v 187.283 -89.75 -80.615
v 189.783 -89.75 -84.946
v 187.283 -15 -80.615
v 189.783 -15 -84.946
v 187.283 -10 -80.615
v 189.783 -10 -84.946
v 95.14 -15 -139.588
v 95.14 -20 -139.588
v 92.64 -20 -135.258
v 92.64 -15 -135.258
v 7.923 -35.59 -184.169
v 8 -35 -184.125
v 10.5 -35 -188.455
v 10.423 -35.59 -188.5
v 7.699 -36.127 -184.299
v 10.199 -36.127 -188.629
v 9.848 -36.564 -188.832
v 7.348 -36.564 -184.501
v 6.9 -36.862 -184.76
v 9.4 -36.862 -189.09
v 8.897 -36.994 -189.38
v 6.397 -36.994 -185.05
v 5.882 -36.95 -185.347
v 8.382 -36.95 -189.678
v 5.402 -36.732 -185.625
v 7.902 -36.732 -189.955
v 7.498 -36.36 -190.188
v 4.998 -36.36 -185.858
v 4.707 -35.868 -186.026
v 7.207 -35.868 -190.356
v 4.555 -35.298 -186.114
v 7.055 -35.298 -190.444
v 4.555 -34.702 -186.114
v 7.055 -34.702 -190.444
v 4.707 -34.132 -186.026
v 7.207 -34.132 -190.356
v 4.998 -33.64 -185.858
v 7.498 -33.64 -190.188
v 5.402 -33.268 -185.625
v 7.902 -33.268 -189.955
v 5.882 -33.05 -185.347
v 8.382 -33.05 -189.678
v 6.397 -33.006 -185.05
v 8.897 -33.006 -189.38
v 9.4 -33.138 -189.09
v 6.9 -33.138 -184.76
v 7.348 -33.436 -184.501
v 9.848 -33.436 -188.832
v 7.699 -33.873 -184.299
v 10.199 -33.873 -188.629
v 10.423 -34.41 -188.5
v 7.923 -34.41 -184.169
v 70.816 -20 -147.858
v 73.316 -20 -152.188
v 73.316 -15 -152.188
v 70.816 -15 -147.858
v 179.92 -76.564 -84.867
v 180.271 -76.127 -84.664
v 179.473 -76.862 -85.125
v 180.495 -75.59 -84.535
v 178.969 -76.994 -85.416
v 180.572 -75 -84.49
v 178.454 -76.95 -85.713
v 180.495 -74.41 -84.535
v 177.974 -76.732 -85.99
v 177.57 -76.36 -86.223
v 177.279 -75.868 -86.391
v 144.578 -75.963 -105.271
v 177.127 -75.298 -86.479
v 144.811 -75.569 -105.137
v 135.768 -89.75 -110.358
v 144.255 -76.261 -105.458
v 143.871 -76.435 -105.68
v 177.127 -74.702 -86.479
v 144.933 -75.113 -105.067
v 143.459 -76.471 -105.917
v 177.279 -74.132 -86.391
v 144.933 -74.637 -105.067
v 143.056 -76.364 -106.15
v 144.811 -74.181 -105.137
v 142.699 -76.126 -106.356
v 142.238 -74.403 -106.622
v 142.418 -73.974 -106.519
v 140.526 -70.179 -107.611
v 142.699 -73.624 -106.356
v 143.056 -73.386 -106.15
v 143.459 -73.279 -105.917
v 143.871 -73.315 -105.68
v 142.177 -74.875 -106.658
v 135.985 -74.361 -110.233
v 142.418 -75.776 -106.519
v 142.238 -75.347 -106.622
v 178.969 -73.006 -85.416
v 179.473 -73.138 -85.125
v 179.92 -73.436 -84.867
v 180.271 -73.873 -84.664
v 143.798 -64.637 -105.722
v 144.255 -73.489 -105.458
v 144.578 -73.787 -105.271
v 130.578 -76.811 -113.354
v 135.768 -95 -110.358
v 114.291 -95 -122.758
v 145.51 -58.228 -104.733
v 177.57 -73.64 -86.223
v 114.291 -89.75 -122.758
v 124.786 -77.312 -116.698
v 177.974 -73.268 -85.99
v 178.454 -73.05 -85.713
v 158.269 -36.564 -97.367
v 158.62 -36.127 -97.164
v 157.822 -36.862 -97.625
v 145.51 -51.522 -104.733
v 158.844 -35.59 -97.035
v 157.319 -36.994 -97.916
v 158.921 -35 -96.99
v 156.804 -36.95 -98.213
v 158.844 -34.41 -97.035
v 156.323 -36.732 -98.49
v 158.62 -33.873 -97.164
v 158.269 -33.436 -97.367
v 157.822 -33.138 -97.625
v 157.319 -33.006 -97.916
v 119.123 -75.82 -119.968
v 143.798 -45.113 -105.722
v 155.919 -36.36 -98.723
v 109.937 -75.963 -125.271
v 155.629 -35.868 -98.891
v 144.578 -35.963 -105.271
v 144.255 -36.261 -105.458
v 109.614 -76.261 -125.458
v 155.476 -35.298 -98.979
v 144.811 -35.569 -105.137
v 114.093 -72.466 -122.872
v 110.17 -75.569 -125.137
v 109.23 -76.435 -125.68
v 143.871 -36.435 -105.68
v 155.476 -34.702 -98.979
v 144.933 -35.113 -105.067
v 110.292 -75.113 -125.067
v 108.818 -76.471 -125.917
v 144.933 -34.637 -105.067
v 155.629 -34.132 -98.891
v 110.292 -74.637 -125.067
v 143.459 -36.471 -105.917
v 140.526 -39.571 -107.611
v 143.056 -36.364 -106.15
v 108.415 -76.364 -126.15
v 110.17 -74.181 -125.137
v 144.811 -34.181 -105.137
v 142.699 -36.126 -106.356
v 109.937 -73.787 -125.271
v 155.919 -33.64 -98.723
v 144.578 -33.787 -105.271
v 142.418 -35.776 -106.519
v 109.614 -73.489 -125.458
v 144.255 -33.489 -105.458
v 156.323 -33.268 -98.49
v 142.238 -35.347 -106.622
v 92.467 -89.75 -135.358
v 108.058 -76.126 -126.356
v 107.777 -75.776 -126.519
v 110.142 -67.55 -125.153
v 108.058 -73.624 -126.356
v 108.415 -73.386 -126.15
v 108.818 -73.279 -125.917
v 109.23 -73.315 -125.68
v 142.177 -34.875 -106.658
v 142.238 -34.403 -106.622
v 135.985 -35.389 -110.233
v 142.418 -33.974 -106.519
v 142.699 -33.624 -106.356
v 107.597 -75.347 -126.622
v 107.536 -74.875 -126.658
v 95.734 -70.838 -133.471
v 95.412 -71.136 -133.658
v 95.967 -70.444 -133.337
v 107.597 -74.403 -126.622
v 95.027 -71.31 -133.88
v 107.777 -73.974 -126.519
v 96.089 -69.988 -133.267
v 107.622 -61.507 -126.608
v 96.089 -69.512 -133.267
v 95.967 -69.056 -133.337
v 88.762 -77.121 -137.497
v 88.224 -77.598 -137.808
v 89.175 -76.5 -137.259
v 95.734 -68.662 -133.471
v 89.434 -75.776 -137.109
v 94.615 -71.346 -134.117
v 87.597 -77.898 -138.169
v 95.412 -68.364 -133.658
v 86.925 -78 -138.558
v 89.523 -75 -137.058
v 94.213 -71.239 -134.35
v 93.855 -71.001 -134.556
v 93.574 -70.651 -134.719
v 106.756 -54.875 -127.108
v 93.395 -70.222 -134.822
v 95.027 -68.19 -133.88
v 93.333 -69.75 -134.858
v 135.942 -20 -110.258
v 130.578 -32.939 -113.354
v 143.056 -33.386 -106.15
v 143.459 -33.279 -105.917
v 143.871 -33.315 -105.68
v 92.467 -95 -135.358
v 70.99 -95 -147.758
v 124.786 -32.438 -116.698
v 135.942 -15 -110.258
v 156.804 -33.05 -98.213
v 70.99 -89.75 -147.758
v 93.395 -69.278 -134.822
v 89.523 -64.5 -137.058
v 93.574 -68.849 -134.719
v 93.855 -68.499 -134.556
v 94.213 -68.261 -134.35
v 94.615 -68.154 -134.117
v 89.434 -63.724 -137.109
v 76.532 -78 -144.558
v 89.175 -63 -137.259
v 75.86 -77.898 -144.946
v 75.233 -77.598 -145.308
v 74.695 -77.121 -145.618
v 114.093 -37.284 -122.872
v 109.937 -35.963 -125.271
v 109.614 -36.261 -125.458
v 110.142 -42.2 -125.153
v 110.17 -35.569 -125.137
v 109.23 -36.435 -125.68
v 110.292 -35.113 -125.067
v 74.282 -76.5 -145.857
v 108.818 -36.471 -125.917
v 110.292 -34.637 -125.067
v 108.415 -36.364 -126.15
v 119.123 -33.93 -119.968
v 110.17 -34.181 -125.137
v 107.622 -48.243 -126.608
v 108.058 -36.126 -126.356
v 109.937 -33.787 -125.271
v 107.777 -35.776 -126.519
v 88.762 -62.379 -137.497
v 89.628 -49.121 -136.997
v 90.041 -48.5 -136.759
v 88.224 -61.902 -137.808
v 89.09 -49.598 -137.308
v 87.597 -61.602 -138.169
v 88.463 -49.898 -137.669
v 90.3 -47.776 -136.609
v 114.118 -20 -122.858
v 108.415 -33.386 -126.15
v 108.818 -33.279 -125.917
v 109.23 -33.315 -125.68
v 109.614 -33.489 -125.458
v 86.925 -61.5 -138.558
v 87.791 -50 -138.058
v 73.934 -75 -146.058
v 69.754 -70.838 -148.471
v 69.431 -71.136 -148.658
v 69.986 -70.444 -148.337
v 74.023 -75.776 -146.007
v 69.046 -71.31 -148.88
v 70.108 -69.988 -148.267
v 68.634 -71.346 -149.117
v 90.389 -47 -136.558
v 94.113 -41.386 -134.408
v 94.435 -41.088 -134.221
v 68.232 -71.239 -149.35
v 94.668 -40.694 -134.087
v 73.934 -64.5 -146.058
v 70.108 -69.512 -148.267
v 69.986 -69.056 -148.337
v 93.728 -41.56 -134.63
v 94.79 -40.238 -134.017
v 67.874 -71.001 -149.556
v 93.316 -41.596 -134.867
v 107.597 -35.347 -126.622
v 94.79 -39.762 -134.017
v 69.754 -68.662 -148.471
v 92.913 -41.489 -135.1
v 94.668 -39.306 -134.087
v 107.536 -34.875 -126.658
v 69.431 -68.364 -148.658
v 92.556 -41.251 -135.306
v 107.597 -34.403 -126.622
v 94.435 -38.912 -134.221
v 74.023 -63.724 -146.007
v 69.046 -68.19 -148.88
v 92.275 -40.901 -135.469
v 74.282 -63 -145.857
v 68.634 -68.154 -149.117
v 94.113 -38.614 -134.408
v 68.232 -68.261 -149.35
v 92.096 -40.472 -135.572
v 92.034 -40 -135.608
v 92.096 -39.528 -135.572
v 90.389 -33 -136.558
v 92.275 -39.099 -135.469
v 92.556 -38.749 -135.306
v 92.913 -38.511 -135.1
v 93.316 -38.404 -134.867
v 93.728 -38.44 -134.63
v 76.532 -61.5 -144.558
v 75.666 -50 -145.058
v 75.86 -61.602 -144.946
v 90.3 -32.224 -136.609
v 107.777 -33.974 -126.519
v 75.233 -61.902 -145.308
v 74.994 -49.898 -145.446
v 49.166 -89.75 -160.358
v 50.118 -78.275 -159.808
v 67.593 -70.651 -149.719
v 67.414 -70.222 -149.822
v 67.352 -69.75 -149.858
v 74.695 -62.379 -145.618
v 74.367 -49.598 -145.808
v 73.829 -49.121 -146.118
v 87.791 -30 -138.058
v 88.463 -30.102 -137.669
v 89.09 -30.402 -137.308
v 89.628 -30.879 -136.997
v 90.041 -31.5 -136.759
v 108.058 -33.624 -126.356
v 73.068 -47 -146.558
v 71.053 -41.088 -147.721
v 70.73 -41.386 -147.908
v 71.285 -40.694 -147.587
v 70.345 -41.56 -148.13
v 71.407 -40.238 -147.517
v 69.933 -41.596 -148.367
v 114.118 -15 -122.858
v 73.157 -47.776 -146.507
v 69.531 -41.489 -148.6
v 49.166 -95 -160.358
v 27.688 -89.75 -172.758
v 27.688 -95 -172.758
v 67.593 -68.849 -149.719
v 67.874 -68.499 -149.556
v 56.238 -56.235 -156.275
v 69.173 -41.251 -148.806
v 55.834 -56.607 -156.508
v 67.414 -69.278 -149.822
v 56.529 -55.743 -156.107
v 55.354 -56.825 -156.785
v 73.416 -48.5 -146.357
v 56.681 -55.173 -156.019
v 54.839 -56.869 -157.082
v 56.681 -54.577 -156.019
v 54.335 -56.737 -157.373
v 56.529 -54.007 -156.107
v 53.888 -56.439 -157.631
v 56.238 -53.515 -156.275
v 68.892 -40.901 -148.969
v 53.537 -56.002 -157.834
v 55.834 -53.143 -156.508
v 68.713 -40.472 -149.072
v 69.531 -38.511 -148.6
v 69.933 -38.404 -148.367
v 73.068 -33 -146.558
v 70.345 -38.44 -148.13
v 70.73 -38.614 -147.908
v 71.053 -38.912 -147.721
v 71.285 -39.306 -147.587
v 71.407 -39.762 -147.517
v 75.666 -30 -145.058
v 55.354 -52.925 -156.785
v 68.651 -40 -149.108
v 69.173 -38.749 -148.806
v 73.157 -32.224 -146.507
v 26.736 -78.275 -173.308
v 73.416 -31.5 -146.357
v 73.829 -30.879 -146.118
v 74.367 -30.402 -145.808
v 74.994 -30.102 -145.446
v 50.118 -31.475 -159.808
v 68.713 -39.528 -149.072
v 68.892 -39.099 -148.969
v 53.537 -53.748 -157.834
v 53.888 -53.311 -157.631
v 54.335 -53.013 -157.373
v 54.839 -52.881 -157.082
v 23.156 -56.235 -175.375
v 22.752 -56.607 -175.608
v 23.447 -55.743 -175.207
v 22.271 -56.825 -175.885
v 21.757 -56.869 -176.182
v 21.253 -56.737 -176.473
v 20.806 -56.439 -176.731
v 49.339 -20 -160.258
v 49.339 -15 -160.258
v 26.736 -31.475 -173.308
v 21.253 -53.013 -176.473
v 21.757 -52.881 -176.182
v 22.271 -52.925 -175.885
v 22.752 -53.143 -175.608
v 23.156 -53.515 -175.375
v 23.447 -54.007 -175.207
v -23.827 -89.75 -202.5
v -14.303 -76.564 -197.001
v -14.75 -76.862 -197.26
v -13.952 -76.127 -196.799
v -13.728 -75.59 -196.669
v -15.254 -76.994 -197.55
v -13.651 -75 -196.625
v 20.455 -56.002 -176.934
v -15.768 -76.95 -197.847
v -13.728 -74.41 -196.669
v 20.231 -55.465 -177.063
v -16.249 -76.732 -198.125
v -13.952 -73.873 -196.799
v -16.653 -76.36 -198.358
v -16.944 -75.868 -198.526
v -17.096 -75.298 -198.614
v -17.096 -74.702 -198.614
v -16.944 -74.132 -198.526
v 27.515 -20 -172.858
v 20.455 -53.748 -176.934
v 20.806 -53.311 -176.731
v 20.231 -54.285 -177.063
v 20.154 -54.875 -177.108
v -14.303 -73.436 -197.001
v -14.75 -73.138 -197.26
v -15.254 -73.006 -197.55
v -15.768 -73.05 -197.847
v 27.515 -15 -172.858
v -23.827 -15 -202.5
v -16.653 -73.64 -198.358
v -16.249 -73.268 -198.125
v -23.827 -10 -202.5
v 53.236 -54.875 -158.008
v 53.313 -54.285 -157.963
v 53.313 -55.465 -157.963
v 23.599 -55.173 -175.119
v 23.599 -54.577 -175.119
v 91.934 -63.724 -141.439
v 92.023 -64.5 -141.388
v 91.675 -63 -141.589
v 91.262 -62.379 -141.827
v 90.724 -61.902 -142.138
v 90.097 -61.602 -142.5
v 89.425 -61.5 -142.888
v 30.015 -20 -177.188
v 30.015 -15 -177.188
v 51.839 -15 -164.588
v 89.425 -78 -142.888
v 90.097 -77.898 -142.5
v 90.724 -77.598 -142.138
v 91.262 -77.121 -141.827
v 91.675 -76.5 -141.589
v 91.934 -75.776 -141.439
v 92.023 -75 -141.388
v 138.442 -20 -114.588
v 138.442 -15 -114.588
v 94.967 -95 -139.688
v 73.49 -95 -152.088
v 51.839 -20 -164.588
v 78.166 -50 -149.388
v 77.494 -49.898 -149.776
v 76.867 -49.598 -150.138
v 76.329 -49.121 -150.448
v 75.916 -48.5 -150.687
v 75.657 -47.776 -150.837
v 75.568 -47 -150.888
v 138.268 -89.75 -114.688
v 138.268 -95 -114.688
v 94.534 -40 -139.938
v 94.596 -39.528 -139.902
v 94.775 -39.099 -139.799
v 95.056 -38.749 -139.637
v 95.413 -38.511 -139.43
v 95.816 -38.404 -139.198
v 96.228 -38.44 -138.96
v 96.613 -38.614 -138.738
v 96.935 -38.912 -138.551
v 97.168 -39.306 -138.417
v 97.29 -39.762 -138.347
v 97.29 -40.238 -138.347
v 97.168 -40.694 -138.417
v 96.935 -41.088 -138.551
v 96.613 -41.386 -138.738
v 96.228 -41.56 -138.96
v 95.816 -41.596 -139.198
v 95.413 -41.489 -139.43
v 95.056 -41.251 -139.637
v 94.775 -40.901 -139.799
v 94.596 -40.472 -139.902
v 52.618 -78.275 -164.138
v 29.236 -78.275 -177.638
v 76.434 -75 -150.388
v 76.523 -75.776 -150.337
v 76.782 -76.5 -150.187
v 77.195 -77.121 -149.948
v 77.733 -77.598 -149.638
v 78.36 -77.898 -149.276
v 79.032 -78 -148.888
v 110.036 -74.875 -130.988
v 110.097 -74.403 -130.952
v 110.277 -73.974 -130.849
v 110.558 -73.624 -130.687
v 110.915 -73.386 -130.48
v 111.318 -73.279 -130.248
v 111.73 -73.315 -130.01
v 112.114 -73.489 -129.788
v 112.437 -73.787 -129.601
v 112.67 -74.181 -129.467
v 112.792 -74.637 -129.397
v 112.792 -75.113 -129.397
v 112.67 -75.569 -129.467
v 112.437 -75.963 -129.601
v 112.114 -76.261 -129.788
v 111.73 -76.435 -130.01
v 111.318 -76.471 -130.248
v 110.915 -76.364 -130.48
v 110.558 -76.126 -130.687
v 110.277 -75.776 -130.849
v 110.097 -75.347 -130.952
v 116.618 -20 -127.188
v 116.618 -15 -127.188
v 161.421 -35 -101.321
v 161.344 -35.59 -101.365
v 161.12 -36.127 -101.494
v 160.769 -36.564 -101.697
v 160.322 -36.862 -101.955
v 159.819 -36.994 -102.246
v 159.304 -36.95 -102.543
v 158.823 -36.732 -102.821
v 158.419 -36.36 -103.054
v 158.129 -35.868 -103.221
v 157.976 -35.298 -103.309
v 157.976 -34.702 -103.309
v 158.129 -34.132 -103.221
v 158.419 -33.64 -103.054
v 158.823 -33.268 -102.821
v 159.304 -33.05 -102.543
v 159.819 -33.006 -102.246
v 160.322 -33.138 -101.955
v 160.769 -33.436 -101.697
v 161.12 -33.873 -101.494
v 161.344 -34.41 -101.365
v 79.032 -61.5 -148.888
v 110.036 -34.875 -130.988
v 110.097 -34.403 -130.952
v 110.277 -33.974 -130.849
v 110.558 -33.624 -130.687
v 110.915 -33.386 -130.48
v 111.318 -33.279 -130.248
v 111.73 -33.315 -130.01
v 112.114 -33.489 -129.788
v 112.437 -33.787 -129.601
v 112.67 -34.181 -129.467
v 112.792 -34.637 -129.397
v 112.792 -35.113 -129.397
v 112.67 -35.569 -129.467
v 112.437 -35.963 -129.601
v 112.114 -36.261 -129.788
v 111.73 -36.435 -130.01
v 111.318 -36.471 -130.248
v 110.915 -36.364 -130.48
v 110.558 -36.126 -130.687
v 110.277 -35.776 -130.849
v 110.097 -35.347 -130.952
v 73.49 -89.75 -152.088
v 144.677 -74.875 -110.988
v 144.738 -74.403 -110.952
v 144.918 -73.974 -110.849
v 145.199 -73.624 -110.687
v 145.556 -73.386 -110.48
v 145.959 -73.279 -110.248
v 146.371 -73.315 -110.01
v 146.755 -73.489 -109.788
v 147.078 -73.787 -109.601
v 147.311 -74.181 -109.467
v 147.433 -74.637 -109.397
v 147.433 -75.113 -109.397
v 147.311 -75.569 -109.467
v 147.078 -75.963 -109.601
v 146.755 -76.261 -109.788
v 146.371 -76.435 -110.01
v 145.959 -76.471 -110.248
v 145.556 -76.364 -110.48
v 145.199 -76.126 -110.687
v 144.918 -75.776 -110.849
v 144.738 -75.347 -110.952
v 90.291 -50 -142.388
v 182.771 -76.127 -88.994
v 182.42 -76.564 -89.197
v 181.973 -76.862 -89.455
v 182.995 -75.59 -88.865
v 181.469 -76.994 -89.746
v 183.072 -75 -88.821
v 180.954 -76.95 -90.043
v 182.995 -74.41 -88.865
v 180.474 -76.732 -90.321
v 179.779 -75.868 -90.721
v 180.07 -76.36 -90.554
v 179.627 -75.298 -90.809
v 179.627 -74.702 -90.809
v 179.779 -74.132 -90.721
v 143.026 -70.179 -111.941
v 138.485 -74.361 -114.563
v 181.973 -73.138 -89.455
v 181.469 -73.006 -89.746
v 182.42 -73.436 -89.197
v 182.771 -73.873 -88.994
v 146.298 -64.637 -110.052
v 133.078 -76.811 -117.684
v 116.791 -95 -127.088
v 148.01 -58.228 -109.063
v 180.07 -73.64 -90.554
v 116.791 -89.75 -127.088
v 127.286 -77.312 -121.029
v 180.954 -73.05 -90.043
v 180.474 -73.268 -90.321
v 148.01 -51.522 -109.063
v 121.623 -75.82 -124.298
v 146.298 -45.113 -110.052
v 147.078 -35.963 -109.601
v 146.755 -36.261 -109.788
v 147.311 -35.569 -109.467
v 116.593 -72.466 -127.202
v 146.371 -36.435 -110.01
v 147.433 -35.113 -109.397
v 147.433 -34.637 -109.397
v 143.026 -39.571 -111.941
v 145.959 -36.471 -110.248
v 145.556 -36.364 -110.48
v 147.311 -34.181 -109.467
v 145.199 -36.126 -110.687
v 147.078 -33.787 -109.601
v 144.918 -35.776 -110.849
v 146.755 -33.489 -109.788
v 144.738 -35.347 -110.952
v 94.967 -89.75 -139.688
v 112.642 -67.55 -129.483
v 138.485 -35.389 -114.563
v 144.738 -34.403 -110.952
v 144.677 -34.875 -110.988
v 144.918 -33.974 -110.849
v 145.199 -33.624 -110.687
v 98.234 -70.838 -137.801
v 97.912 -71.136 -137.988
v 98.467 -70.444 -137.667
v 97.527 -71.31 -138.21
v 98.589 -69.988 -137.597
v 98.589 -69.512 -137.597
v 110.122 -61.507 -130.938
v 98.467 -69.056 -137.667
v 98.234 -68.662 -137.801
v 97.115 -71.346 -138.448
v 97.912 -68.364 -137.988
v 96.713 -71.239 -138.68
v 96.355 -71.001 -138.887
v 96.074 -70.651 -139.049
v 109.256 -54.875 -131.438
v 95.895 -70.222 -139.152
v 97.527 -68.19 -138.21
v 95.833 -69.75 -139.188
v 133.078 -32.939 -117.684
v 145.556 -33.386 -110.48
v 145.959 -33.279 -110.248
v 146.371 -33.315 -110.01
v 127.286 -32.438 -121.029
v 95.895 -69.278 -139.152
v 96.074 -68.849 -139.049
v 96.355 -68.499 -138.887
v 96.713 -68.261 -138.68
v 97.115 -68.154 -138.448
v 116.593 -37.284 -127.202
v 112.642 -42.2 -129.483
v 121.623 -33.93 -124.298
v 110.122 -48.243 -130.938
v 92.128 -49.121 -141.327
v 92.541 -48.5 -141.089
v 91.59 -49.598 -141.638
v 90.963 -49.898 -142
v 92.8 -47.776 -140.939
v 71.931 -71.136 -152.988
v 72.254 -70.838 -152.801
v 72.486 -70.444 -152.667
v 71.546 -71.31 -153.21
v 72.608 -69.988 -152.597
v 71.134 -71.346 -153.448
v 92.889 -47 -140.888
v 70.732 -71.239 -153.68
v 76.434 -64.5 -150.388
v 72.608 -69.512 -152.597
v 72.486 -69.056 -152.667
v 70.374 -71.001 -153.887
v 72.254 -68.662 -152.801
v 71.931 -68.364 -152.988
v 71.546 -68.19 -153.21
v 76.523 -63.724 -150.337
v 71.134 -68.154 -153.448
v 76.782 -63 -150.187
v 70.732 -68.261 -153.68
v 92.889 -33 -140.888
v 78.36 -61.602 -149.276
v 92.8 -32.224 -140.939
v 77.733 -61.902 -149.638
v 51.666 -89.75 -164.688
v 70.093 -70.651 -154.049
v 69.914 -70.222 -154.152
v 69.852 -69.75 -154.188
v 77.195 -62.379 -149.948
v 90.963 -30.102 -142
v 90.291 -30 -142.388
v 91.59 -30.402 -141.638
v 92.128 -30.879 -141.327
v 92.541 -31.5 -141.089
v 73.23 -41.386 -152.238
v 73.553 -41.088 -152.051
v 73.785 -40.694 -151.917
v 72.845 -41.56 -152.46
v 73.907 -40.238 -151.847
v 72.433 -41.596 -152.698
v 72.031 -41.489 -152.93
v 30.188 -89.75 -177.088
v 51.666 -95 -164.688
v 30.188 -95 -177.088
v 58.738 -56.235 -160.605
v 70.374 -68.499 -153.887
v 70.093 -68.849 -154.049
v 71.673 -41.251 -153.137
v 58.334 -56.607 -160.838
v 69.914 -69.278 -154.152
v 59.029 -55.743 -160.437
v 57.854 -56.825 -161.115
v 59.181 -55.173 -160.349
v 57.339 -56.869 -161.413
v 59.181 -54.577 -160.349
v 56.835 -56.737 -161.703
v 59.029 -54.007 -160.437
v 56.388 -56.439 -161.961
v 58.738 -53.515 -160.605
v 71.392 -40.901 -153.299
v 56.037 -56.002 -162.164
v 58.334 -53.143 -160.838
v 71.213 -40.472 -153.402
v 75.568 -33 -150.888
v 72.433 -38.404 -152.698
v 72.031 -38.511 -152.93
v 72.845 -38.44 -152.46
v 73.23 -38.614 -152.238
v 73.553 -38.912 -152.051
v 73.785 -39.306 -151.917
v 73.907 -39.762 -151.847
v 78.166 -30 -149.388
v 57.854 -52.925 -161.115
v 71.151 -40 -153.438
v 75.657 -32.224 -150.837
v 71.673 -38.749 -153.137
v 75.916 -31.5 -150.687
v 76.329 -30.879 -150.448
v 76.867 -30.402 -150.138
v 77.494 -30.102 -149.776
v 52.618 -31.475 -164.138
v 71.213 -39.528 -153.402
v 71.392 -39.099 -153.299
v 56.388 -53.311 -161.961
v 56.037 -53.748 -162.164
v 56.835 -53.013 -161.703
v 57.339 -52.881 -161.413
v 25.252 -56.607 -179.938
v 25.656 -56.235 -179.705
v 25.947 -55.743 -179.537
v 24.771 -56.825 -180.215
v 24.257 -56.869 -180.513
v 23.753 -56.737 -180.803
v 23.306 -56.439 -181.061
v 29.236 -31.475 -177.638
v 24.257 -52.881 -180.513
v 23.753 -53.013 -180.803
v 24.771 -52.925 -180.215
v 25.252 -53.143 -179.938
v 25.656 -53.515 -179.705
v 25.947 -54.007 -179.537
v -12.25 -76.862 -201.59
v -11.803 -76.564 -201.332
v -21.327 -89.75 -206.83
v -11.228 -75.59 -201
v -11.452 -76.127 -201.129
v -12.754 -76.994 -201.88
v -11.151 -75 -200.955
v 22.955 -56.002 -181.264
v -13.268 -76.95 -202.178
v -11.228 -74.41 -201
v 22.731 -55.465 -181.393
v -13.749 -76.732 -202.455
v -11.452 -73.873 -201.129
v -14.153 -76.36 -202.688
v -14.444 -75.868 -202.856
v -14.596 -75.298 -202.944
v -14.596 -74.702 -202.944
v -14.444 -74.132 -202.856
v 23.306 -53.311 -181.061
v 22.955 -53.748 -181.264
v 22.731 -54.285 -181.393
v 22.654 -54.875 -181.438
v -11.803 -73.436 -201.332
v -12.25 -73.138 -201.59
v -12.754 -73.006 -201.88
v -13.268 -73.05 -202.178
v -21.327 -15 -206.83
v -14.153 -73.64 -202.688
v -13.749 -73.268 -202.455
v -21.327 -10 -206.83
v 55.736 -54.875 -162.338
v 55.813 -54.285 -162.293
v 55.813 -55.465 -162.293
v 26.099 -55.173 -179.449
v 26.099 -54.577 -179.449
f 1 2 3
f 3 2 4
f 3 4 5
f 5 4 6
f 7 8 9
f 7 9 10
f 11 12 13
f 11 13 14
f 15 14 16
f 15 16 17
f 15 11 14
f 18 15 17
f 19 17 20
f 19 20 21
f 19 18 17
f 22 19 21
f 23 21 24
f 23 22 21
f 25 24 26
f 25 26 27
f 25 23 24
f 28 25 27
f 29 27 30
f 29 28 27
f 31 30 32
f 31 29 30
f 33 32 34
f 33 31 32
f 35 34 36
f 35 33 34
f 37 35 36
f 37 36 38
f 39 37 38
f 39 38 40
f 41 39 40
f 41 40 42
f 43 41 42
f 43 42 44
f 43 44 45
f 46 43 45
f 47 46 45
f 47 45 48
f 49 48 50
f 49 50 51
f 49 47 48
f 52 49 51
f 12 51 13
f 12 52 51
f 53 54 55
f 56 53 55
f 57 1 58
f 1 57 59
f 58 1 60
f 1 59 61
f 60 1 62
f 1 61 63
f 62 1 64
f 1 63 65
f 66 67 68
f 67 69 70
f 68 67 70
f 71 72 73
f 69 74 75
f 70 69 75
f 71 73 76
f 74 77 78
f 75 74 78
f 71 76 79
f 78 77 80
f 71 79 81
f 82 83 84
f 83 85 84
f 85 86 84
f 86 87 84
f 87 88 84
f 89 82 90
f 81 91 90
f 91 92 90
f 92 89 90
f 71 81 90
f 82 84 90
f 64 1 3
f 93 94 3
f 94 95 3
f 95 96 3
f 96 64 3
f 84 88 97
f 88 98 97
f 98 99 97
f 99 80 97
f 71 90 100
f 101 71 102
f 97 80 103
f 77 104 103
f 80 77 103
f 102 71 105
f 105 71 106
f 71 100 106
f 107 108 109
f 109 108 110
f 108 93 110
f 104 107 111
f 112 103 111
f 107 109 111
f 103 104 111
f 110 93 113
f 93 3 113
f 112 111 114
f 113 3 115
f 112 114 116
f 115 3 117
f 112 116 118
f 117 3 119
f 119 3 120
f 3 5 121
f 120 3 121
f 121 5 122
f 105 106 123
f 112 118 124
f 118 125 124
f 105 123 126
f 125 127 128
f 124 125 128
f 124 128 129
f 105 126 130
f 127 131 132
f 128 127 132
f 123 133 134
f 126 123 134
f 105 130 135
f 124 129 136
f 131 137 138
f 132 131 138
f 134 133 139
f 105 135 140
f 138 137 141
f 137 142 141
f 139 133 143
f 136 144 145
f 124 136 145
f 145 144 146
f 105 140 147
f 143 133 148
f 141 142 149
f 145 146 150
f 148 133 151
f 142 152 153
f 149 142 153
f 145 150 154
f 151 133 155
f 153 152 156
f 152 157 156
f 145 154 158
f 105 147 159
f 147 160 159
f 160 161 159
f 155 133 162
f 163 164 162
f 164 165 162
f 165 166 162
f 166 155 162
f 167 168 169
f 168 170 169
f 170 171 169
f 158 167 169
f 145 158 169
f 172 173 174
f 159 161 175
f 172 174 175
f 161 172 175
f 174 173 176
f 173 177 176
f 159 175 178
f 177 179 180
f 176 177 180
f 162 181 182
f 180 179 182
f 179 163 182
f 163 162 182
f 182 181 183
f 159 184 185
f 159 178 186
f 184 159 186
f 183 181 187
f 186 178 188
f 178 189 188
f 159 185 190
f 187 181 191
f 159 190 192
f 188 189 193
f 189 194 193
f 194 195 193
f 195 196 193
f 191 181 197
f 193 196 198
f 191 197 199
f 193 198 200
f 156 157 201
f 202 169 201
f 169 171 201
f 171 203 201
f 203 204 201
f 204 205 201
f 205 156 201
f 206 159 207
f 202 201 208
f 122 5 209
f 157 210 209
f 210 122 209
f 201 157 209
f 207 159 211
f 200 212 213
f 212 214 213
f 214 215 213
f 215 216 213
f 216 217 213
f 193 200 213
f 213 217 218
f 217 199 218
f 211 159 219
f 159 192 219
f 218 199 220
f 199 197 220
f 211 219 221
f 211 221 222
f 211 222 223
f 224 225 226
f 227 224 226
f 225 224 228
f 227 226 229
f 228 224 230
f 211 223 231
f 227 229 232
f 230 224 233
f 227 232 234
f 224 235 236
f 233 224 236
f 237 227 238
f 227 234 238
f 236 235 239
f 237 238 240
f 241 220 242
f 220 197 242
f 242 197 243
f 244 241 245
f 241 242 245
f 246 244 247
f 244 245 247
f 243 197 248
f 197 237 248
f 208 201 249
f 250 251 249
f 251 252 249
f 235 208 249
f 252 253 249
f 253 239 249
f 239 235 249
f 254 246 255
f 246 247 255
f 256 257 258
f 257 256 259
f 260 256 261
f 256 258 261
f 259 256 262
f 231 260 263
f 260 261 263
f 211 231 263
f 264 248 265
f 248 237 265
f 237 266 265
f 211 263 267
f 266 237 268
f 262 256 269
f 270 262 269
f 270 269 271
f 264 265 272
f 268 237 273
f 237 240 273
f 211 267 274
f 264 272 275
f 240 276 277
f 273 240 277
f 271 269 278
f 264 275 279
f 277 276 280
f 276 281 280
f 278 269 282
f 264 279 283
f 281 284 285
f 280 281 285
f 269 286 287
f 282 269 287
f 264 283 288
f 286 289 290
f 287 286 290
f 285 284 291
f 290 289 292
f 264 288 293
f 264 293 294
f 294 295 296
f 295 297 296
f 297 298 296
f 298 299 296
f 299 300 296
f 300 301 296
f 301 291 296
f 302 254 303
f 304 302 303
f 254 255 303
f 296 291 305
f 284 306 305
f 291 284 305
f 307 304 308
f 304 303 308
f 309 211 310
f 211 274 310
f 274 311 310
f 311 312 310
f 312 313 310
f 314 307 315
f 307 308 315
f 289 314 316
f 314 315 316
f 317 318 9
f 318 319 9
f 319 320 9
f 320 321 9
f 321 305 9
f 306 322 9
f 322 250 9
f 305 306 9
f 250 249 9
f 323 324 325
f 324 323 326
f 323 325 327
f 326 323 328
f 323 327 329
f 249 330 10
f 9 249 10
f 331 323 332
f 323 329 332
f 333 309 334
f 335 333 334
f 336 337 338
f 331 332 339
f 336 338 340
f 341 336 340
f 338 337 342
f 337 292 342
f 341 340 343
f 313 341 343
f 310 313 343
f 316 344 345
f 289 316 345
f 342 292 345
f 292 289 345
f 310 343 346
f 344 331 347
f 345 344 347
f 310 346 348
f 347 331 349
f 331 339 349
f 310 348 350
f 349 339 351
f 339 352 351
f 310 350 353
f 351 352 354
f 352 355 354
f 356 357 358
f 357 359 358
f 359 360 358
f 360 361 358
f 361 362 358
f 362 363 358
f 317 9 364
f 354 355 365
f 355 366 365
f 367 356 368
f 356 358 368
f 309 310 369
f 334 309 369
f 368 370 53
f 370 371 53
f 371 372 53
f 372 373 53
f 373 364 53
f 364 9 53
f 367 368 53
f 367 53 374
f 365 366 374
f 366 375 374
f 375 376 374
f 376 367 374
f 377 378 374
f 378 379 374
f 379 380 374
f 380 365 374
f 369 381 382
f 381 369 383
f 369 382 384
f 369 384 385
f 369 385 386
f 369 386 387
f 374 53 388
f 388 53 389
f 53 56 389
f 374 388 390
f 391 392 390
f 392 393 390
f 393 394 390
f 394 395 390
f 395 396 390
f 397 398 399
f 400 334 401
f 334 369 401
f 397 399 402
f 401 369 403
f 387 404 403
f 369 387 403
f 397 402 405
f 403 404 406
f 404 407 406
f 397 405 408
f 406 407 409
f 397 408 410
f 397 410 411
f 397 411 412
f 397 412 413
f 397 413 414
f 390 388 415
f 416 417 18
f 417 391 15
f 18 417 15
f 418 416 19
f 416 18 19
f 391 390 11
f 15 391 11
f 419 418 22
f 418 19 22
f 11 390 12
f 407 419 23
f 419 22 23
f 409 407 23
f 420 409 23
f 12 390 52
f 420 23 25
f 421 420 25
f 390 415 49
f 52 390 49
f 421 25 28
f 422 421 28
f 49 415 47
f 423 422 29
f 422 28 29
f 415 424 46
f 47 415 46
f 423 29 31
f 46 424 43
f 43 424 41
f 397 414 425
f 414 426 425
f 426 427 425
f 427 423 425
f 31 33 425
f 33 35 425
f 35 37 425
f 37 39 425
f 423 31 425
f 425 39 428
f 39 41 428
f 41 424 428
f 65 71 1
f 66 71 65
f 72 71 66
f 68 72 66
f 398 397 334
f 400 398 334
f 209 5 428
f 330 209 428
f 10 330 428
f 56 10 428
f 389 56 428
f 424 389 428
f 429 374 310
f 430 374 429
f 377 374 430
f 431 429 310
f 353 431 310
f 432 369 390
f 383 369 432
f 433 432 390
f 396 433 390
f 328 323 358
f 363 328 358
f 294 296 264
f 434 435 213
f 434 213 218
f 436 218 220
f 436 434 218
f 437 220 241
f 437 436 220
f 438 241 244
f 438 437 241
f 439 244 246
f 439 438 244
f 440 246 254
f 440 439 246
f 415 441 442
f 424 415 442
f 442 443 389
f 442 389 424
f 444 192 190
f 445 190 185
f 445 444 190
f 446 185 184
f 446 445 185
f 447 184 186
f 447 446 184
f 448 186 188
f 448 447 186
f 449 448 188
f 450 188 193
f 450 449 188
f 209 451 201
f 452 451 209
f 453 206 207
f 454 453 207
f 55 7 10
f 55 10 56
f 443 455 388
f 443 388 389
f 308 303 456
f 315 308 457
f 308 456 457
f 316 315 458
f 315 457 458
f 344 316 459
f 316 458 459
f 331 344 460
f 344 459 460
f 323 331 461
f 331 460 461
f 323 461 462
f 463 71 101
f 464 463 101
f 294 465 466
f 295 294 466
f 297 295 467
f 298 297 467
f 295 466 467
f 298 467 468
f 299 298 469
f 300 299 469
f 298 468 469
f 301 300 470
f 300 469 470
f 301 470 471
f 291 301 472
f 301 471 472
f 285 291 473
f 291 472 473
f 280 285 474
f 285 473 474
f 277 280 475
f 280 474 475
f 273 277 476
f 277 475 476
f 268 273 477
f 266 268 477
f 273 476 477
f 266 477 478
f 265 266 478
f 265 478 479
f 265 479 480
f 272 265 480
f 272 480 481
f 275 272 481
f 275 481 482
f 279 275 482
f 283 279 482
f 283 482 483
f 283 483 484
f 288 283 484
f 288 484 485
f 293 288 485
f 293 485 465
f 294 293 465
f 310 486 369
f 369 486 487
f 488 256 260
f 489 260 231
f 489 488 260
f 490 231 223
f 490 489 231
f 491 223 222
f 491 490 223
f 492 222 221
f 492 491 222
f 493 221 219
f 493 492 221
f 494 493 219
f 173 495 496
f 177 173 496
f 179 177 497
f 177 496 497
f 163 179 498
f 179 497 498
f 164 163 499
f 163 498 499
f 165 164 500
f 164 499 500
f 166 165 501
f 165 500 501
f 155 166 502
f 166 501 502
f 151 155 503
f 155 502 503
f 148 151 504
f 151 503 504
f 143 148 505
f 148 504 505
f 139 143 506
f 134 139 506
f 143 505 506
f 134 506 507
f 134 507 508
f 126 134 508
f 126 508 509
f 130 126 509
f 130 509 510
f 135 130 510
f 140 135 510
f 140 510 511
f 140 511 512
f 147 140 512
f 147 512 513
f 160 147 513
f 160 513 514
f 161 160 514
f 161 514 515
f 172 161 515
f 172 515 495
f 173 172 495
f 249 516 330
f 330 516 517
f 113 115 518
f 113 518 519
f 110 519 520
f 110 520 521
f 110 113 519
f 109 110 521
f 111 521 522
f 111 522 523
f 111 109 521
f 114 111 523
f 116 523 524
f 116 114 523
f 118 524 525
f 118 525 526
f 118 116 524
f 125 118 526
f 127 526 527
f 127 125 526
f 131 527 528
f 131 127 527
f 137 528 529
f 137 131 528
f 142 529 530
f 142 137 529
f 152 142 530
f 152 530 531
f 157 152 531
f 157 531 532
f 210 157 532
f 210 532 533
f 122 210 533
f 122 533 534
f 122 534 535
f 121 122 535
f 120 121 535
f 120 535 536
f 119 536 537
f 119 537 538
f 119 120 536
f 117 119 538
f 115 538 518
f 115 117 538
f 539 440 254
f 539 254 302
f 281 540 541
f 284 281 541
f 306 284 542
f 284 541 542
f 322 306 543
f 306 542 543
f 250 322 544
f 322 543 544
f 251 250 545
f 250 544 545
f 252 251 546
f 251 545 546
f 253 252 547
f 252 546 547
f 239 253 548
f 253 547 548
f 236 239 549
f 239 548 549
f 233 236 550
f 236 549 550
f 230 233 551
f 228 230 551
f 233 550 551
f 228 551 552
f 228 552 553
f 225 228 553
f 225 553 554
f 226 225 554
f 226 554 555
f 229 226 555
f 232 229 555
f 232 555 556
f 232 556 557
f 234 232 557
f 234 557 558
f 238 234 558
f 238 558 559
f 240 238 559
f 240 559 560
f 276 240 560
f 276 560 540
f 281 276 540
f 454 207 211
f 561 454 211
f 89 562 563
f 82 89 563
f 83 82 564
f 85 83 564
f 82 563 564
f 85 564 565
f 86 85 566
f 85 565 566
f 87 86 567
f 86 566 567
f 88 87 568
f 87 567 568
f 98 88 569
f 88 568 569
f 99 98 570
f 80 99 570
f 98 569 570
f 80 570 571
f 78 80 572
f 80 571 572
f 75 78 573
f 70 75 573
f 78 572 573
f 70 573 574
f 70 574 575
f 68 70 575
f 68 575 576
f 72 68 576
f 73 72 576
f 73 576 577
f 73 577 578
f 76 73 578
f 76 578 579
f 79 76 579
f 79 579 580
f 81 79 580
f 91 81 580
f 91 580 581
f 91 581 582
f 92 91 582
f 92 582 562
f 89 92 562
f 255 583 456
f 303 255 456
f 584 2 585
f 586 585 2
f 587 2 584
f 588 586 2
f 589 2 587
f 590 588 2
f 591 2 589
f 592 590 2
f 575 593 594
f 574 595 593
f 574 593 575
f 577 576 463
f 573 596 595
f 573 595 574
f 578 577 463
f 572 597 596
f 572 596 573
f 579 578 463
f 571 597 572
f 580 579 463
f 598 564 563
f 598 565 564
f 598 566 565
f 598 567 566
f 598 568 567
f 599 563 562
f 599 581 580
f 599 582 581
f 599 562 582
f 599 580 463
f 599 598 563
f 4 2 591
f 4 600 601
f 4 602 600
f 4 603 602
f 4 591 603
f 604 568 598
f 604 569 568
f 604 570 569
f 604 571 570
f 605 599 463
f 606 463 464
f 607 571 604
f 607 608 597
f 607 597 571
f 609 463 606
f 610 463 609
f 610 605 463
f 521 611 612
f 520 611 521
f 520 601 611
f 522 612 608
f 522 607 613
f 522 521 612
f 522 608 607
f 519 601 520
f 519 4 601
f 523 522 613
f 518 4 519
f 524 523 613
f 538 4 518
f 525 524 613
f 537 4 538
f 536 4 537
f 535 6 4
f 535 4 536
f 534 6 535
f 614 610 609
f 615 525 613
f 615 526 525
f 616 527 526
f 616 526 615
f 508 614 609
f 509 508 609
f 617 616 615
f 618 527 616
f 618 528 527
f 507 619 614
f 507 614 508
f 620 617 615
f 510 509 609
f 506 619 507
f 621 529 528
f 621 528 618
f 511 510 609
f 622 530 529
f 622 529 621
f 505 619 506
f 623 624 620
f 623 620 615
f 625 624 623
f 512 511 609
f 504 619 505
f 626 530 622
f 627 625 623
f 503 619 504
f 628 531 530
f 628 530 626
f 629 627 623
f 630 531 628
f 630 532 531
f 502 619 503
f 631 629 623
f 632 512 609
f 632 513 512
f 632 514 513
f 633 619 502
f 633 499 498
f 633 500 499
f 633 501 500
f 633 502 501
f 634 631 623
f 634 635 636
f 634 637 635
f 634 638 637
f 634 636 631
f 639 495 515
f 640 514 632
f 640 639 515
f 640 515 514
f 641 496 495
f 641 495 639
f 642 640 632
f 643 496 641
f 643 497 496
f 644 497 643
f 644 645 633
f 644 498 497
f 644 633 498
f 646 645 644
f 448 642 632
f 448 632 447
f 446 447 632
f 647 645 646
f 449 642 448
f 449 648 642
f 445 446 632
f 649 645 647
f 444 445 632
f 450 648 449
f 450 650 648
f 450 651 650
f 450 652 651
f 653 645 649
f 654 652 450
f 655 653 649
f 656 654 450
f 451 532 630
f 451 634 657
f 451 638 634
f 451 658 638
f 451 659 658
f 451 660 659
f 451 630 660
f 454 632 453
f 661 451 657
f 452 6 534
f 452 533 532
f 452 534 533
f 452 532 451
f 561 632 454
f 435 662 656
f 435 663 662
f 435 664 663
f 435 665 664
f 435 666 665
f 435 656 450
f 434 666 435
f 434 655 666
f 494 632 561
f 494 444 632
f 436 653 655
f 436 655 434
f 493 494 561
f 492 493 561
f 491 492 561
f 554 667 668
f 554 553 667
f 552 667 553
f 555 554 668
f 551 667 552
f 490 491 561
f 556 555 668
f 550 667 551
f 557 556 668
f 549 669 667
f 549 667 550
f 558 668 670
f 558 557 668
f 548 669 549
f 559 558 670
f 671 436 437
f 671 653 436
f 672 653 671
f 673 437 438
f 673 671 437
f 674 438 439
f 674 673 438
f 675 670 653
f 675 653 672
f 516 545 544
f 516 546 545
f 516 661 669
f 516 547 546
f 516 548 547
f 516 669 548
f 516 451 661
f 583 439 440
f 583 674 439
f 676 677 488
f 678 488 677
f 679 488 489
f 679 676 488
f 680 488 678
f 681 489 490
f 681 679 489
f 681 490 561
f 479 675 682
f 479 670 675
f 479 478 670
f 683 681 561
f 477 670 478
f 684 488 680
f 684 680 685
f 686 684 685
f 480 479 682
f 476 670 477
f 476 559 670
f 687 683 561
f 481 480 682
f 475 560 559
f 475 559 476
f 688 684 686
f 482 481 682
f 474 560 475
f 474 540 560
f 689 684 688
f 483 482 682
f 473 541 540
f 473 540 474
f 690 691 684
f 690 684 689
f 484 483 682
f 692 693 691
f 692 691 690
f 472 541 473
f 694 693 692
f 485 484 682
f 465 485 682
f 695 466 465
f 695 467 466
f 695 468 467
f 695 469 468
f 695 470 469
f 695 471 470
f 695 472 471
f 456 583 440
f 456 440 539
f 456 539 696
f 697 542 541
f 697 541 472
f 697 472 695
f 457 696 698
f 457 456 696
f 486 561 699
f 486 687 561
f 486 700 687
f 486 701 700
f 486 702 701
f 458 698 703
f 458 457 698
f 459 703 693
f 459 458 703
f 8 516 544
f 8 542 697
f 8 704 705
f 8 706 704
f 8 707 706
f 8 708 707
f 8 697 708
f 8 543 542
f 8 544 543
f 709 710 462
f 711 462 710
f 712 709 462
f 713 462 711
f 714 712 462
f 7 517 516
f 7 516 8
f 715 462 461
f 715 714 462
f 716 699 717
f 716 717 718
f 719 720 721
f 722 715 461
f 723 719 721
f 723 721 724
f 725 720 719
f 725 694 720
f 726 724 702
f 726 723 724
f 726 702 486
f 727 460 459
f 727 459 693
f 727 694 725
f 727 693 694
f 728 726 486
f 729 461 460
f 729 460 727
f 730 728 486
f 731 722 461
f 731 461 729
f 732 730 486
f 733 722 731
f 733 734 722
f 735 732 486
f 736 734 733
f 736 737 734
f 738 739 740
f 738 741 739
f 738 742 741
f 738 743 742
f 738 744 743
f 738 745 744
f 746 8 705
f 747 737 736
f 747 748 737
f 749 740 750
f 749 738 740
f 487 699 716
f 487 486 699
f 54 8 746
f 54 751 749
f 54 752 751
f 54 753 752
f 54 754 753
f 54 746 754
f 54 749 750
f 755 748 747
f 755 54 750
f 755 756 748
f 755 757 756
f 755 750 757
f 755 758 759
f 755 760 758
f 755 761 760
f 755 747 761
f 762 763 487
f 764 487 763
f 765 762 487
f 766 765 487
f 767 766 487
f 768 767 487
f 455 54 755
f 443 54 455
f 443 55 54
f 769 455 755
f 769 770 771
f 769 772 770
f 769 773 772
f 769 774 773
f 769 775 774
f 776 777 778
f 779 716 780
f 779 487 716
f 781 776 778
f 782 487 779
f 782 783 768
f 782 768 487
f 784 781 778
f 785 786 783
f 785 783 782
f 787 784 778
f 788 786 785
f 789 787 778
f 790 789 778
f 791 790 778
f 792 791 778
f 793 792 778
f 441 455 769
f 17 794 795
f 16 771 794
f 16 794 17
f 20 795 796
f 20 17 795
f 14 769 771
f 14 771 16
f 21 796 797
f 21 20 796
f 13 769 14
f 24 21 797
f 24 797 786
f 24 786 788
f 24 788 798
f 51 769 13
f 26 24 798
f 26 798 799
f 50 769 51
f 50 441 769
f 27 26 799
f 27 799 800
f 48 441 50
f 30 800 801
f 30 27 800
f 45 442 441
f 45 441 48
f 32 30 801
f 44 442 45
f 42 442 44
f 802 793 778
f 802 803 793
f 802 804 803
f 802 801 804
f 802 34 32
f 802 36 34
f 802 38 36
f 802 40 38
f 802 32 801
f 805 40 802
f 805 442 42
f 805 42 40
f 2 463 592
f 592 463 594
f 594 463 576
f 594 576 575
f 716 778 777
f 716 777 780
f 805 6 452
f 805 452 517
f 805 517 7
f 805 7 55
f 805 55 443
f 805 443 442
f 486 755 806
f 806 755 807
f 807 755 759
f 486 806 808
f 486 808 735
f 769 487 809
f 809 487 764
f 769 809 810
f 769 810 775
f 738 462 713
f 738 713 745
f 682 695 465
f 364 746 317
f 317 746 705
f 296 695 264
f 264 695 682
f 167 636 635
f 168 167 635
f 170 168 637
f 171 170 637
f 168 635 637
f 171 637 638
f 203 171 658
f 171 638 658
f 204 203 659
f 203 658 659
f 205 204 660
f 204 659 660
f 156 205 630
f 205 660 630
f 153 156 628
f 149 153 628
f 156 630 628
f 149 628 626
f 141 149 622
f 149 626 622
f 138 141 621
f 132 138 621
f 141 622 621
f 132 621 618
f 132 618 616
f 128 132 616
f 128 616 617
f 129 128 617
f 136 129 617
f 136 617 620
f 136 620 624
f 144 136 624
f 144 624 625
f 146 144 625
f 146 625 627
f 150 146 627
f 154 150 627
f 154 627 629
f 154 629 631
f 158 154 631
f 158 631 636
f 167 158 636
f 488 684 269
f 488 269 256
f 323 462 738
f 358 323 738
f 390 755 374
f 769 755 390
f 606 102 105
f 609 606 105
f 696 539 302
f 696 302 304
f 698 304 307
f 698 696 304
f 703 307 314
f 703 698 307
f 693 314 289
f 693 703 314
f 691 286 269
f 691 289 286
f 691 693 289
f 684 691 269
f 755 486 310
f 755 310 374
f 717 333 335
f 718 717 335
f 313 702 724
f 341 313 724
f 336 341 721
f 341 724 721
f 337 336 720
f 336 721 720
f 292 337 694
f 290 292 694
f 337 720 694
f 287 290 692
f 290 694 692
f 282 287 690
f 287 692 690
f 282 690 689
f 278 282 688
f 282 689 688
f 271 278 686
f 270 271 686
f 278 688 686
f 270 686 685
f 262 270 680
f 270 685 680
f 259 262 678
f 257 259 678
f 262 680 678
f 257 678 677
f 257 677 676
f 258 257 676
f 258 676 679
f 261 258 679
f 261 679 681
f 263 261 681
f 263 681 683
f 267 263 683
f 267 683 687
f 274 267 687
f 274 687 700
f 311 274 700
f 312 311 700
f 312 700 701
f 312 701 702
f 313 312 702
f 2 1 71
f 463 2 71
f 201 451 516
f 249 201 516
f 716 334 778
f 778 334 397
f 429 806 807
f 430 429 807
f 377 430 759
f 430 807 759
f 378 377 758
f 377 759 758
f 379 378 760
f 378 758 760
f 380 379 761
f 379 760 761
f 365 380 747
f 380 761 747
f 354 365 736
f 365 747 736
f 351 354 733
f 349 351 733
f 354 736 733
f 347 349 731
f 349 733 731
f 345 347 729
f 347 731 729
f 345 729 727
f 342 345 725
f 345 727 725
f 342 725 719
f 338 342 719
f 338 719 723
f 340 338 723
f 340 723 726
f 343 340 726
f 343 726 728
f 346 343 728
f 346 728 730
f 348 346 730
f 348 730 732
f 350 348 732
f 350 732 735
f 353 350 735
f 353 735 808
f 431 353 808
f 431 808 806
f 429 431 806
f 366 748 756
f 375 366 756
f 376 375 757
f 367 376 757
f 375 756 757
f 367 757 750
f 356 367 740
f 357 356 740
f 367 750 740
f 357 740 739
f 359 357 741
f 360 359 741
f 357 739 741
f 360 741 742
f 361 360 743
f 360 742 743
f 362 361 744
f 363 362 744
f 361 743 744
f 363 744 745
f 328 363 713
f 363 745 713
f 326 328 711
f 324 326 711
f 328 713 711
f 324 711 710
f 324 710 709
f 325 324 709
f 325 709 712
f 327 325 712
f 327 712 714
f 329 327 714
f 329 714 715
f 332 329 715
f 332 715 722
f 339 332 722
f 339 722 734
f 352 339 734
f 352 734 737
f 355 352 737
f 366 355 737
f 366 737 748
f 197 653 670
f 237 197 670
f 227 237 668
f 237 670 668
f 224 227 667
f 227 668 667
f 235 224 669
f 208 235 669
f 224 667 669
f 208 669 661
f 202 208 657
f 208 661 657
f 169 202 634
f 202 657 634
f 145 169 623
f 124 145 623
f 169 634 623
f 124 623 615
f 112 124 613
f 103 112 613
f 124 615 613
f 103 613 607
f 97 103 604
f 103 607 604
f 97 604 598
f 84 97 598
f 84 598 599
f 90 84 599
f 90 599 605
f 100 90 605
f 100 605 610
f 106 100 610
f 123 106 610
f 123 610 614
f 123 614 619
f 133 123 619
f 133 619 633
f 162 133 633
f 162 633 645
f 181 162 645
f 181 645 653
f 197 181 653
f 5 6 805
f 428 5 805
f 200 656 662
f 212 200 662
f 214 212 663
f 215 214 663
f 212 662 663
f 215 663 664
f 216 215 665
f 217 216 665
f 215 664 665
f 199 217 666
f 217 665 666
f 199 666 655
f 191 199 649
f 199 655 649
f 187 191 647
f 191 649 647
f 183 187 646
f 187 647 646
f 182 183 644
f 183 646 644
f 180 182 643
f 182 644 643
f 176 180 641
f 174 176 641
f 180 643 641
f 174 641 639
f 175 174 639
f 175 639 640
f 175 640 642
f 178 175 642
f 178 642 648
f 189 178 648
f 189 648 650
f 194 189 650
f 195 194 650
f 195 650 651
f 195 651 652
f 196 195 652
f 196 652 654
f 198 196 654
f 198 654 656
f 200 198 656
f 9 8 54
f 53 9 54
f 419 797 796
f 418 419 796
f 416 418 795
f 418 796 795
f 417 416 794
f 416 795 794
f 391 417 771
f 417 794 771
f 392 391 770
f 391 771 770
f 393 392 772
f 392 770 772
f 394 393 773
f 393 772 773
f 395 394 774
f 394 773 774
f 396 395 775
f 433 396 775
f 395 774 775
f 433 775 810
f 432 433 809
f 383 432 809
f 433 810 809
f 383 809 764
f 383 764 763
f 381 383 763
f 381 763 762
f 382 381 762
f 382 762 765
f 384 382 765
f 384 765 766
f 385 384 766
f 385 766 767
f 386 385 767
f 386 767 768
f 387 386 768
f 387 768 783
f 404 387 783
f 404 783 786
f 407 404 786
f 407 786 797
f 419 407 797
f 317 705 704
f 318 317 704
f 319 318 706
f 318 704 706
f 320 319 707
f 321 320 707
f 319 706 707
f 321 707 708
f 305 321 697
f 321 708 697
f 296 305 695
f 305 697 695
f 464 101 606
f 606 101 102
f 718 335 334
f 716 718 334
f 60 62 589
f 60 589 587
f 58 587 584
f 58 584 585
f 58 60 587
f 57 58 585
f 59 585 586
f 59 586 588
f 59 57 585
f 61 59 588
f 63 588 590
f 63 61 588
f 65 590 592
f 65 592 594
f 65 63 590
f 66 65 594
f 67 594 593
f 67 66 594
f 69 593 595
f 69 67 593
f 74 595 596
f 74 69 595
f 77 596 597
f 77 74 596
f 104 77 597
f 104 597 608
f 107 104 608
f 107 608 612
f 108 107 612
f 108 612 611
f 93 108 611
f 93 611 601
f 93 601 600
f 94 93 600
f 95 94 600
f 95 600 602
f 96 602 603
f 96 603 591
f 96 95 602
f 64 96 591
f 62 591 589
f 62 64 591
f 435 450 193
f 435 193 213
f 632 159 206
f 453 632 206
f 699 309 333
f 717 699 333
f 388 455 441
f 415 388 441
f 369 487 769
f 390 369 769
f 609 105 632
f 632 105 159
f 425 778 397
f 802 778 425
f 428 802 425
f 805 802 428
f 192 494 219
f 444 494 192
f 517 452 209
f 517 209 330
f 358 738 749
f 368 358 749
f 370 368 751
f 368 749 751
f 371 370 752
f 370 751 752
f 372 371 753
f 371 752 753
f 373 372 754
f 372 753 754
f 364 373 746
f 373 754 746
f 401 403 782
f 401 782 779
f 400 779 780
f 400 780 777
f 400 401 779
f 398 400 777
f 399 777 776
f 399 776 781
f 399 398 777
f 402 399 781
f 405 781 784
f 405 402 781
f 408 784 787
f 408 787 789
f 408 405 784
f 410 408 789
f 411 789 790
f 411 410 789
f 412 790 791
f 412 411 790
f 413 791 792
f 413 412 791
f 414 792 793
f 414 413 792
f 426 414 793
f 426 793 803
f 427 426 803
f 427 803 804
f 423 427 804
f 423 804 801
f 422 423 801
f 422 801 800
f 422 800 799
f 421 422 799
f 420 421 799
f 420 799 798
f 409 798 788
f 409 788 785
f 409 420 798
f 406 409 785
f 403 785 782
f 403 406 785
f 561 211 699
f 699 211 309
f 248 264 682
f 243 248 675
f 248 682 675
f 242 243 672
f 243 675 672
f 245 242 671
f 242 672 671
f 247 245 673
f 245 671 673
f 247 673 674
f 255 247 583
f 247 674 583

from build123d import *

# Parameters (mm, degrees)
STOCK_ACRYLIC_BAY_WALL_MASTER_1_START     = 163.456714755
STOCK_ACRYLIC_BAY_WALL_MASTER_1_OUTLINE_R = 2
STOCK_ACRYLIC_BAY_WALL_MASTER_1_DEPTH     = 5
SKETCH1_W                                 = 243.769145362
SKETCH1_H                                 = 5
BOSS_EXTRUDE1_DEPTH                       = 5
SKETCH2_W                                 = 25.2
SKETCH2_H                                 = 5
CUT_EXTRUDE1_DEPTH                        = 158.991773268
SKETCH3_R                                 = 1.6
CUT_EXTRUDE2_DEPTH                        = 158.991773268
SKETCH4_R                                 = 2
SKETCH4_W                                 = 27
SKETCH4_H                                 = 46.8
CUT_EXTRUDE3_DEPTH                        = 158.991773268
SKETCH5_R                                 = 22.5
SKETCH5_R_2                               = 1.6
CUT_EXTRUDE4_DEPTH                        = 158.991773268


# Read off the part's stored shape, not the designer's step: Stock-acrylic-bay-wall-master-1
with BuildPart() as part:
    # Stock-acrylic-bay-wall-master-1 outline → Stock-acrylic-bay-wall-master-1 (new body)
    with BuildSketch(Plane(origin=(0, 0, 0), x_dir=(0.866025403784438, 0, 0.500000000000001), z_dir=(0.500000000000001, 0, -0.866025403784438)).offset(STOCK_ACRYLIC_BAY_WALL_MASTER_1_START)):
        Polygon((-121.884572681, 15), (121.884572681, 15), (121.884572681, 89.75), (62.4, 89.75), (62.4, 95), (37.6, 95), (37.6, 89.75), (12.4, 89.75), (12.4, 95), (-12.4, 95), (-12.4, 89.75), (-37.6, 89.75), (-37.6, 95), (-62.4, 95), (-62.4, 89.75), (-121.884572681, 89.75), align=None)
        with Locations((-87.134572681, 35)):
            Circle(STOCK_ACRYLIC_BAY_WALL_MASTER_1_OUTLINE_R, mode=Mode.SUBTRACT)
        with Locations((87.134572681, 35)):
            Circle(STOCK_ACRYLIC_BAY_WALL_MASTER_1_OUTLINE_R, mode=Mode.SUBTRACT)
        with Locations((-112.134572681, 75)):
            Circle(STOCK_ACRYLIC_BAY_WALL_MASTER_1_OUTLINE_R, mode=Mode.SUBTRACT)
        with Locations((112.134572681, 75)):
            Circle(STOCK_ACRYLIC_BAY_WALL_MASTER_1_OUTLINE_R, mode=Mode.SUBTRACT)
    extrude(amount=STOCK_ACRYLIC_BAY_WALL_MASTER_1_DEPTH)

    # Sketch1 → Boss-Extrude1 (add)
    with BuildSketch(Plane(origin=(84.228357378, 0, -145.887794416), x_dir=(-0.8660254037844382, 0, -0.5000000000000009), z_dir=(0.5000000000000009, 0, -0.8660254037844382))):
        with Locations((0, -12.5)):
            Rectangle(SKETCH1_W, SKETCH1_H)
    extrude(amount=-BOSS_EXTRUDE1_DEPTH)

    # Sketch2 → Cut-Extrude1 (cut, through all)
    with BuildSketch(Plane(origin=(84.228357378, 0, -145.887794416), x_dir=(-0.8660254037844382, 0, -0.5000000000000009), z_dir=(0.5000000000000009, 0, -0.8660254037844382))):
        with Locations((-50, -17.5)):
            Rectangle(SKETCH2_W, SKETCH2_H)
        with Locations((0, -17.5)):
            Rectangle(SKETCH2_W, SKETCH2_H)
        with Locations((50, -17.5)):
            Rectangle(SKETCH2_W, SKETCH2_H)
    extrude(amount=-CUT_EXTRUDE1_DEPTH, mode=Mode.SUBTRACT)

    # Sketch3 → Cut-Extrude2 (cut, through all)
    with BuildSketch(Plane(origin=(84.228357378, 0, -145.887794416), x_dir=(-0.8660254037844382, 0, -0.5000000000000009), z_dir=(0.5000000000000009, 0, -0.8660254037844382))):
        with Locations((13.5, -40)):
            Circle(SKETCH3_R)
        with Locations((-13.5, -40)):
            Circle(SKETCH3_R)
        with Locations((15, -69.75)):
            Circle(SKETCH3_R)
        with Locations((-15, -69.75)):
            Circle(SKETCH3_R)
        with BuildLine():
            Line((10, -47), (10, -33))
            ThreePointArc((10, -33), (9.121320344, -30.878679656), (7, -30))
            Line((7, -30), (-7, -30))
            ThreePointArc((-7, -30), (-9.121320344, -30.878679656), (-10, -33))
            Line((-10, -33), (-10, -47))
            ThreePointArc((-10, -47), (-9.121320344, -49.121320344), (-7, -50))
            Line((-7, -50), (7, -50))
            ThreePointArc((7, -50), (9.121320344, -49.121320344), (10, -47))
        make_face()
        with BuildLine():
            Line((-6, -61.5), (6, -61.5))
            ThreePointArc((6, -61.5), (8.121320344, -62.378679656), (9, -64.5))
            Line((9, -64.5), (9, -75))
            ThreePointArc((9, -75), (8.121320344, -77.121320344), (6, -78))
            Line((6, -78), (-6, -78))
            ThreePointArc((-6, -78), (-8.121320344, -77.121320344), (-9, -75))
            Line((-9, -75), (-9, -64.5))
            ThreePointArc((-9, -64.5), (-8.121320344, -62.378679656), (-6, -61.5))
        make_face()
    extrude(amount=-CUT_EXTRUDE2_DEPTH, mode=Mode.SUBTRACT)

    # Sketch4 → Cut-Extrude3 (cut, through all)
    with BuildSketch(Plane(origin=(84.228357378, 0, -145.887794416), x_dir=(-0.8660254037844382, 0, -0.5000000000000009), z_dir=(0.5000000000000009, 0, -0.8660254037844382))):
        with Locations((69.1, -54.875)):
            Circle(SKETCH4_R)
        with Locations((30.9, -54.875)):
            Circle(SKETCH4_R)
        with Locations((50, -54.875)):
            Rectangle(SKETCH4_W, SKETCH4_H)
    extrude(amount=-CUT_EXTRUDE3_DEPTH, mode=Mode.SUBTRACT)

    # Sketch5 → Cut-Extrude4 (cut, through all)
    with BuildSketch(Plane(origin=(84.228357378, 0, -145.887794416), x_dir=(-0.8660254037844382, 0, -0.5000000000000009), z_dir=(0.5000000000000009, 0, -0.8660254037844382))):
        with Locations((-51.4, -54.875)):
            Circle(SKETCH5_R)
        with Locations((-71.4, -34.875)):
            Circle(SKETCH5_R_2)
        with Locations((-31.4, -34.875)):
            Circle(SKETCH5_R_2)
        with Locations((-31.4, -74.875)):
            Circle(SKETCH5_R_2)
        with Locations((-71.4, -74.875)):
            Circle(SKETCH5_R_2)
    extrude(amount=-CUT_EXTRUDE4_DEPTH, mode=Mode.SUBTRACT)


solid = part.part
